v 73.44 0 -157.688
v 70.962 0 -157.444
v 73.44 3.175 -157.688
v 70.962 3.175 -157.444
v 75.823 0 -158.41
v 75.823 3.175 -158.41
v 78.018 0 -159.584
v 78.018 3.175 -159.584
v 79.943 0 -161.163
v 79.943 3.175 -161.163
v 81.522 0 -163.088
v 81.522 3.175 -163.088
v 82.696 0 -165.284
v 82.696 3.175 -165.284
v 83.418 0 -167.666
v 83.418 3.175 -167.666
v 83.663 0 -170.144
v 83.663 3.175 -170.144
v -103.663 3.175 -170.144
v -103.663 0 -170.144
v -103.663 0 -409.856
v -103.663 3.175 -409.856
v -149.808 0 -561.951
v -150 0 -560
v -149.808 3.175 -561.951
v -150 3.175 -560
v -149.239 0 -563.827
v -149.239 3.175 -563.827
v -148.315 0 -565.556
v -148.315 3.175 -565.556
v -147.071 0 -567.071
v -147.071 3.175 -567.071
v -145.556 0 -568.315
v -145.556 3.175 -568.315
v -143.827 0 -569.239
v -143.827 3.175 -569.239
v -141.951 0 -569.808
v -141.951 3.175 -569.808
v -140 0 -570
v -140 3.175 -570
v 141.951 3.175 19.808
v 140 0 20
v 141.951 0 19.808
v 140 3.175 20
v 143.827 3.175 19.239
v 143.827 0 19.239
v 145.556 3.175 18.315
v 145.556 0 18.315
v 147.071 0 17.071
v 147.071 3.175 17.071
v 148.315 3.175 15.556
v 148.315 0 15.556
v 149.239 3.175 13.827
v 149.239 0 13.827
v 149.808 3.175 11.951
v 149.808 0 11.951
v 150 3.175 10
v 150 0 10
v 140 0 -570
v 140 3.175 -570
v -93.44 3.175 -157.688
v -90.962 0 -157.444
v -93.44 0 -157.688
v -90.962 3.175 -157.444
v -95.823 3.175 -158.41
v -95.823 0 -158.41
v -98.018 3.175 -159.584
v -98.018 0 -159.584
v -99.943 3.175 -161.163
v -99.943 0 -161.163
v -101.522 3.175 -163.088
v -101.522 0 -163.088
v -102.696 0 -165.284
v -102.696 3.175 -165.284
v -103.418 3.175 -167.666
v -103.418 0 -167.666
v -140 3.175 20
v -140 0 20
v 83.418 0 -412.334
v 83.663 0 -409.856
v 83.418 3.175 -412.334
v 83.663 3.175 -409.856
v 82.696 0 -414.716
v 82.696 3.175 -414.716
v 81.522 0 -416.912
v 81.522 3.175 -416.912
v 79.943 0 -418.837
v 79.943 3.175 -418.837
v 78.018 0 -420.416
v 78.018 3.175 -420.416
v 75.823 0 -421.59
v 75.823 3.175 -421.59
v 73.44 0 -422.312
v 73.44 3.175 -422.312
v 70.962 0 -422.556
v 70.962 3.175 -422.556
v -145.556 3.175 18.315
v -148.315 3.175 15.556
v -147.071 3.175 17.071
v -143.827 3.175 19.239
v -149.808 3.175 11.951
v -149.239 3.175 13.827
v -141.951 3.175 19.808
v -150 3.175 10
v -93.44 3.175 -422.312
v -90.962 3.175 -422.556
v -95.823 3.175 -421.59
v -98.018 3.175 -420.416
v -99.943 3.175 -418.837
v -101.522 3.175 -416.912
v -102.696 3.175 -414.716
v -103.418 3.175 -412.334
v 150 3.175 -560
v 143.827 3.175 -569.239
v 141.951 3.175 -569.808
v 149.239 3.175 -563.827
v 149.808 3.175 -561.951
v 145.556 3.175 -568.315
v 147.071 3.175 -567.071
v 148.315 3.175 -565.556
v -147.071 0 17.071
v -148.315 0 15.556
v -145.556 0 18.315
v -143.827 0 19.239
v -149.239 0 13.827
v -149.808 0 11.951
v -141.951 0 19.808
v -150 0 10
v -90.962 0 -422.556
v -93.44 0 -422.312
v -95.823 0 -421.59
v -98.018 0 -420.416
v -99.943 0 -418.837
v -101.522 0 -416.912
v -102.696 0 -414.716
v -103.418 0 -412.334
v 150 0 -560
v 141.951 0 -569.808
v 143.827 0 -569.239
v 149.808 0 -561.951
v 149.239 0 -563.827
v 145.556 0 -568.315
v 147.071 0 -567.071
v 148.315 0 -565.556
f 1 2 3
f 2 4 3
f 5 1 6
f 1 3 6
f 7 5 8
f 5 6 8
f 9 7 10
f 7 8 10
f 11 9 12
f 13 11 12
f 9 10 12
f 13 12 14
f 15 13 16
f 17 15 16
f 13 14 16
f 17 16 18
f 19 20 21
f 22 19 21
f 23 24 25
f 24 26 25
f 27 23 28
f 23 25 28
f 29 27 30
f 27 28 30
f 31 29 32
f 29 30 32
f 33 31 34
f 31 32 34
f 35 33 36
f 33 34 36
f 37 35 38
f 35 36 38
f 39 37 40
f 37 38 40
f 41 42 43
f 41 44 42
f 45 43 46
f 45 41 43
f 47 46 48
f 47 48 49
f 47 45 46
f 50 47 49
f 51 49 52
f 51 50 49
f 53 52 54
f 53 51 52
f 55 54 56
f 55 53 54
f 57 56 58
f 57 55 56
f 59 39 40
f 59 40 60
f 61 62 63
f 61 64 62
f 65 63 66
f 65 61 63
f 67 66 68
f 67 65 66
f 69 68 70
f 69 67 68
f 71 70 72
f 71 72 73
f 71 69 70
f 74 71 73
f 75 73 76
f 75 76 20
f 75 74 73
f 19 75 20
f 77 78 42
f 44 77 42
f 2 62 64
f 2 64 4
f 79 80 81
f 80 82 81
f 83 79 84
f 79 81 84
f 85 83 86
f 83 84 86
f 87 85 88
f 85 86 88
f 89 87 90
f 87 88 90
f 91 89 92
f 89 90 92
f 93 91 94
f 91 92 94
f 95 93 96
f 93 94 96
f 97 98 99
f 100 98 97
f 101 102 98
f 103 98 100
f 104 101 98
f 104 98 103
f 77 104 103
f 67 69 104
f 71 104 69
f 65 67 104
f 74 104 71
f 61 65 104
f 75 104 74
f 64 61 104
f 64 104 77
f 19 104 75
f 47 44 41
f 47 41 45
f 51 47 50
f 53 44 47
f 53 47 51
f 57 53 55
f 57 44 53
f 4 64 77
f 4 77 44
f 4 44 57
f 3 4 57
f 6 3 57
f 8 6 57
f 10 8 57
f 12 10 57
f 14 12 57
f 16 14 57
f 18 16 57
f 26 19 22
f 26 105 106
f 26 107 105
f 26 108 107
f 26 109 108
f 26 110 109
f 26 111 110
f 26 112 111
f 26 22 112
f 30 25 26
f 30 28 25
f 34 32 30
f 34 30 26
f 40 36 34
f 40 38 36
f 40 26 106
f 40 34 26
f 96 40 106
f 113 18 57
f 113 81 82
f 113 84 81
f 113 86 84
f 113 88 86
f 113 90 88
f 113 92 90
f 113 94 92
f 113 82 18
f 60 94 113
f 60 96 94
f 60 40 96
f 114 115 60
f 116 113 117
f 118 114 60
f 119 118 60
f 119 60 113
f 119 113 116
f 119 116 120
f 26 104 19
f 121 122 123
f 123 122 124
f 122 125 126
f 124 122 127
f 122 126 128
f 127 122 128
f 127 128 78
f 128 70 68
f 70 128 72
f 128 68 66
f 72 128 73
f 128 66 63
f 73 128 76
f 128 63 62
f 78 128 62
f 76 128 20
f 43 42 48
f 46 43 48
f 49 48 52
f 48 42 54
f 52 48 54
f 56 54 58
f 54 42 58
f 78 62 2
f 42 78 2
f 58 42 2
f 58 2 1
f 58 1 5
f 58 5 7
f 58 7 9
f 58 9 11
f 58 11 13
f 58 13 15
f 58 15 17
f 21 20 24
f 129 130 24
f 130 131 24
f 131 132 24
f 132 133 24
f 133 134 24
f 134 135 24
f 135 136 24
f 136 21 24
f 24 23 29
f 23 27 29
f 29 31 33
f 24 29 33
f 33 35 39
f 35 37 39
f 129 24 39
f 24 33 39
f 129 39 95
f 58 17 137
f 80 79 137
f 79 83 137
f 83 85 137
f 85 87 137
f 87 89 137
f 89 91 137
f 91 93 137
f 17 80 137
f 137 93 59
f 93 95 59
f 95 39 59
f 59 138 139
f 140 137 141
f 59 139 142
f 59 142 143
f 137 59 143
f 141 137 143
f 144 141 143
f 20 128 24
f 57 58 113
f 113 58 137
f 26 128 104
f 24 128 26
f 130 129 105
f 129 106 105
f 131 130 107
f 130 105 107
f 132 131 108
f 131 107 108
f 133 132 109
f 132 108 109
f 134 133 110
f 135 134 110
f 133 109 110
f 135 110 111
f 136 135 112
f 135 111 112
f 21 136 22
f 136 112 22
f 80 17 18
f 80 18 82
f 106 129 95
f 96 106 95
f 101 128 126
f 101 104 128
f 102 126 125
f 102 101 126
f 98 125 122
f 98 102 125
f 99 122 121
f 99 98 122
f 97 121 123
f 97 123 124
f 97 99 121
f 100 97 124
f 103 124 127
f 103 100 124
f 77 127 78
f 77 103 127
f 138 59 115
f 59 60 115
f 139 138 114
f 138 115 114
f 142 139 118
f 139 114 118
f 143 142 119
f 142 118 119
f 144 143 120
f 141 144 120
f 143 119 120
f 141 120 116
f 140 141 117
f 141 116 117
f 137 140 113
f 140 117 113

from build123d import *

# Parameters (mm, degrees)
SKETCH9_W           = 300
SKETCH9_H           = 590
SKETCH9_W_2         = 187.325
SKETCH9_H_2         = 265.1125
BOSS_EXTRUDE7_DEPTH = 3.175
FILLET4_R           = 10
FILLET5_R           = 12.7


with BuildPart() as part:
    # Sketch9 → Boss-Extrude7 (new body)
    with BuildSketch(Plane(origin=(0, 0, 0), x_dir=(1, 0, 0), z_dir=(0, 1, 0))):
        with Locations((0, 275)):
            Rectangle(SKETCH9_W, SKETCH9_H)
        with Locations((-10, 290)):
            Rectangle(SKETCH9_W_2, SKETCH9_H_2, mode=Mode.SUBTRACT)
    extrude(amount=BOSS_EXTRUDE7_DEPTH)

    # Fillet4
    fillet4_edges = [part.edges().sort_by_distance(p)[0] for p in [
        (150, 1.5875, -570),
        (150, 1.5875, 20),
        (-150, 1.5875, 20),
        (-150, 1.5875, -570),
    ]]
    fillet(fillet4_edges, radius=FILLET4_R)

    # Fillet5
    fillet5_edges = [part.edges().sort_by_distance(p)[0] for p in [
        (83.6625, 1.5875, -157.44375),
        (83.6625, 1.5875, -422.55625),
        (-103.6625, 1.5875, -422.55625),
        (-103.6625, 1.5875, -157.44375),
    ]]
    fillet(fillet5_edges, radius=FILLET5_R)


solid = part.part
